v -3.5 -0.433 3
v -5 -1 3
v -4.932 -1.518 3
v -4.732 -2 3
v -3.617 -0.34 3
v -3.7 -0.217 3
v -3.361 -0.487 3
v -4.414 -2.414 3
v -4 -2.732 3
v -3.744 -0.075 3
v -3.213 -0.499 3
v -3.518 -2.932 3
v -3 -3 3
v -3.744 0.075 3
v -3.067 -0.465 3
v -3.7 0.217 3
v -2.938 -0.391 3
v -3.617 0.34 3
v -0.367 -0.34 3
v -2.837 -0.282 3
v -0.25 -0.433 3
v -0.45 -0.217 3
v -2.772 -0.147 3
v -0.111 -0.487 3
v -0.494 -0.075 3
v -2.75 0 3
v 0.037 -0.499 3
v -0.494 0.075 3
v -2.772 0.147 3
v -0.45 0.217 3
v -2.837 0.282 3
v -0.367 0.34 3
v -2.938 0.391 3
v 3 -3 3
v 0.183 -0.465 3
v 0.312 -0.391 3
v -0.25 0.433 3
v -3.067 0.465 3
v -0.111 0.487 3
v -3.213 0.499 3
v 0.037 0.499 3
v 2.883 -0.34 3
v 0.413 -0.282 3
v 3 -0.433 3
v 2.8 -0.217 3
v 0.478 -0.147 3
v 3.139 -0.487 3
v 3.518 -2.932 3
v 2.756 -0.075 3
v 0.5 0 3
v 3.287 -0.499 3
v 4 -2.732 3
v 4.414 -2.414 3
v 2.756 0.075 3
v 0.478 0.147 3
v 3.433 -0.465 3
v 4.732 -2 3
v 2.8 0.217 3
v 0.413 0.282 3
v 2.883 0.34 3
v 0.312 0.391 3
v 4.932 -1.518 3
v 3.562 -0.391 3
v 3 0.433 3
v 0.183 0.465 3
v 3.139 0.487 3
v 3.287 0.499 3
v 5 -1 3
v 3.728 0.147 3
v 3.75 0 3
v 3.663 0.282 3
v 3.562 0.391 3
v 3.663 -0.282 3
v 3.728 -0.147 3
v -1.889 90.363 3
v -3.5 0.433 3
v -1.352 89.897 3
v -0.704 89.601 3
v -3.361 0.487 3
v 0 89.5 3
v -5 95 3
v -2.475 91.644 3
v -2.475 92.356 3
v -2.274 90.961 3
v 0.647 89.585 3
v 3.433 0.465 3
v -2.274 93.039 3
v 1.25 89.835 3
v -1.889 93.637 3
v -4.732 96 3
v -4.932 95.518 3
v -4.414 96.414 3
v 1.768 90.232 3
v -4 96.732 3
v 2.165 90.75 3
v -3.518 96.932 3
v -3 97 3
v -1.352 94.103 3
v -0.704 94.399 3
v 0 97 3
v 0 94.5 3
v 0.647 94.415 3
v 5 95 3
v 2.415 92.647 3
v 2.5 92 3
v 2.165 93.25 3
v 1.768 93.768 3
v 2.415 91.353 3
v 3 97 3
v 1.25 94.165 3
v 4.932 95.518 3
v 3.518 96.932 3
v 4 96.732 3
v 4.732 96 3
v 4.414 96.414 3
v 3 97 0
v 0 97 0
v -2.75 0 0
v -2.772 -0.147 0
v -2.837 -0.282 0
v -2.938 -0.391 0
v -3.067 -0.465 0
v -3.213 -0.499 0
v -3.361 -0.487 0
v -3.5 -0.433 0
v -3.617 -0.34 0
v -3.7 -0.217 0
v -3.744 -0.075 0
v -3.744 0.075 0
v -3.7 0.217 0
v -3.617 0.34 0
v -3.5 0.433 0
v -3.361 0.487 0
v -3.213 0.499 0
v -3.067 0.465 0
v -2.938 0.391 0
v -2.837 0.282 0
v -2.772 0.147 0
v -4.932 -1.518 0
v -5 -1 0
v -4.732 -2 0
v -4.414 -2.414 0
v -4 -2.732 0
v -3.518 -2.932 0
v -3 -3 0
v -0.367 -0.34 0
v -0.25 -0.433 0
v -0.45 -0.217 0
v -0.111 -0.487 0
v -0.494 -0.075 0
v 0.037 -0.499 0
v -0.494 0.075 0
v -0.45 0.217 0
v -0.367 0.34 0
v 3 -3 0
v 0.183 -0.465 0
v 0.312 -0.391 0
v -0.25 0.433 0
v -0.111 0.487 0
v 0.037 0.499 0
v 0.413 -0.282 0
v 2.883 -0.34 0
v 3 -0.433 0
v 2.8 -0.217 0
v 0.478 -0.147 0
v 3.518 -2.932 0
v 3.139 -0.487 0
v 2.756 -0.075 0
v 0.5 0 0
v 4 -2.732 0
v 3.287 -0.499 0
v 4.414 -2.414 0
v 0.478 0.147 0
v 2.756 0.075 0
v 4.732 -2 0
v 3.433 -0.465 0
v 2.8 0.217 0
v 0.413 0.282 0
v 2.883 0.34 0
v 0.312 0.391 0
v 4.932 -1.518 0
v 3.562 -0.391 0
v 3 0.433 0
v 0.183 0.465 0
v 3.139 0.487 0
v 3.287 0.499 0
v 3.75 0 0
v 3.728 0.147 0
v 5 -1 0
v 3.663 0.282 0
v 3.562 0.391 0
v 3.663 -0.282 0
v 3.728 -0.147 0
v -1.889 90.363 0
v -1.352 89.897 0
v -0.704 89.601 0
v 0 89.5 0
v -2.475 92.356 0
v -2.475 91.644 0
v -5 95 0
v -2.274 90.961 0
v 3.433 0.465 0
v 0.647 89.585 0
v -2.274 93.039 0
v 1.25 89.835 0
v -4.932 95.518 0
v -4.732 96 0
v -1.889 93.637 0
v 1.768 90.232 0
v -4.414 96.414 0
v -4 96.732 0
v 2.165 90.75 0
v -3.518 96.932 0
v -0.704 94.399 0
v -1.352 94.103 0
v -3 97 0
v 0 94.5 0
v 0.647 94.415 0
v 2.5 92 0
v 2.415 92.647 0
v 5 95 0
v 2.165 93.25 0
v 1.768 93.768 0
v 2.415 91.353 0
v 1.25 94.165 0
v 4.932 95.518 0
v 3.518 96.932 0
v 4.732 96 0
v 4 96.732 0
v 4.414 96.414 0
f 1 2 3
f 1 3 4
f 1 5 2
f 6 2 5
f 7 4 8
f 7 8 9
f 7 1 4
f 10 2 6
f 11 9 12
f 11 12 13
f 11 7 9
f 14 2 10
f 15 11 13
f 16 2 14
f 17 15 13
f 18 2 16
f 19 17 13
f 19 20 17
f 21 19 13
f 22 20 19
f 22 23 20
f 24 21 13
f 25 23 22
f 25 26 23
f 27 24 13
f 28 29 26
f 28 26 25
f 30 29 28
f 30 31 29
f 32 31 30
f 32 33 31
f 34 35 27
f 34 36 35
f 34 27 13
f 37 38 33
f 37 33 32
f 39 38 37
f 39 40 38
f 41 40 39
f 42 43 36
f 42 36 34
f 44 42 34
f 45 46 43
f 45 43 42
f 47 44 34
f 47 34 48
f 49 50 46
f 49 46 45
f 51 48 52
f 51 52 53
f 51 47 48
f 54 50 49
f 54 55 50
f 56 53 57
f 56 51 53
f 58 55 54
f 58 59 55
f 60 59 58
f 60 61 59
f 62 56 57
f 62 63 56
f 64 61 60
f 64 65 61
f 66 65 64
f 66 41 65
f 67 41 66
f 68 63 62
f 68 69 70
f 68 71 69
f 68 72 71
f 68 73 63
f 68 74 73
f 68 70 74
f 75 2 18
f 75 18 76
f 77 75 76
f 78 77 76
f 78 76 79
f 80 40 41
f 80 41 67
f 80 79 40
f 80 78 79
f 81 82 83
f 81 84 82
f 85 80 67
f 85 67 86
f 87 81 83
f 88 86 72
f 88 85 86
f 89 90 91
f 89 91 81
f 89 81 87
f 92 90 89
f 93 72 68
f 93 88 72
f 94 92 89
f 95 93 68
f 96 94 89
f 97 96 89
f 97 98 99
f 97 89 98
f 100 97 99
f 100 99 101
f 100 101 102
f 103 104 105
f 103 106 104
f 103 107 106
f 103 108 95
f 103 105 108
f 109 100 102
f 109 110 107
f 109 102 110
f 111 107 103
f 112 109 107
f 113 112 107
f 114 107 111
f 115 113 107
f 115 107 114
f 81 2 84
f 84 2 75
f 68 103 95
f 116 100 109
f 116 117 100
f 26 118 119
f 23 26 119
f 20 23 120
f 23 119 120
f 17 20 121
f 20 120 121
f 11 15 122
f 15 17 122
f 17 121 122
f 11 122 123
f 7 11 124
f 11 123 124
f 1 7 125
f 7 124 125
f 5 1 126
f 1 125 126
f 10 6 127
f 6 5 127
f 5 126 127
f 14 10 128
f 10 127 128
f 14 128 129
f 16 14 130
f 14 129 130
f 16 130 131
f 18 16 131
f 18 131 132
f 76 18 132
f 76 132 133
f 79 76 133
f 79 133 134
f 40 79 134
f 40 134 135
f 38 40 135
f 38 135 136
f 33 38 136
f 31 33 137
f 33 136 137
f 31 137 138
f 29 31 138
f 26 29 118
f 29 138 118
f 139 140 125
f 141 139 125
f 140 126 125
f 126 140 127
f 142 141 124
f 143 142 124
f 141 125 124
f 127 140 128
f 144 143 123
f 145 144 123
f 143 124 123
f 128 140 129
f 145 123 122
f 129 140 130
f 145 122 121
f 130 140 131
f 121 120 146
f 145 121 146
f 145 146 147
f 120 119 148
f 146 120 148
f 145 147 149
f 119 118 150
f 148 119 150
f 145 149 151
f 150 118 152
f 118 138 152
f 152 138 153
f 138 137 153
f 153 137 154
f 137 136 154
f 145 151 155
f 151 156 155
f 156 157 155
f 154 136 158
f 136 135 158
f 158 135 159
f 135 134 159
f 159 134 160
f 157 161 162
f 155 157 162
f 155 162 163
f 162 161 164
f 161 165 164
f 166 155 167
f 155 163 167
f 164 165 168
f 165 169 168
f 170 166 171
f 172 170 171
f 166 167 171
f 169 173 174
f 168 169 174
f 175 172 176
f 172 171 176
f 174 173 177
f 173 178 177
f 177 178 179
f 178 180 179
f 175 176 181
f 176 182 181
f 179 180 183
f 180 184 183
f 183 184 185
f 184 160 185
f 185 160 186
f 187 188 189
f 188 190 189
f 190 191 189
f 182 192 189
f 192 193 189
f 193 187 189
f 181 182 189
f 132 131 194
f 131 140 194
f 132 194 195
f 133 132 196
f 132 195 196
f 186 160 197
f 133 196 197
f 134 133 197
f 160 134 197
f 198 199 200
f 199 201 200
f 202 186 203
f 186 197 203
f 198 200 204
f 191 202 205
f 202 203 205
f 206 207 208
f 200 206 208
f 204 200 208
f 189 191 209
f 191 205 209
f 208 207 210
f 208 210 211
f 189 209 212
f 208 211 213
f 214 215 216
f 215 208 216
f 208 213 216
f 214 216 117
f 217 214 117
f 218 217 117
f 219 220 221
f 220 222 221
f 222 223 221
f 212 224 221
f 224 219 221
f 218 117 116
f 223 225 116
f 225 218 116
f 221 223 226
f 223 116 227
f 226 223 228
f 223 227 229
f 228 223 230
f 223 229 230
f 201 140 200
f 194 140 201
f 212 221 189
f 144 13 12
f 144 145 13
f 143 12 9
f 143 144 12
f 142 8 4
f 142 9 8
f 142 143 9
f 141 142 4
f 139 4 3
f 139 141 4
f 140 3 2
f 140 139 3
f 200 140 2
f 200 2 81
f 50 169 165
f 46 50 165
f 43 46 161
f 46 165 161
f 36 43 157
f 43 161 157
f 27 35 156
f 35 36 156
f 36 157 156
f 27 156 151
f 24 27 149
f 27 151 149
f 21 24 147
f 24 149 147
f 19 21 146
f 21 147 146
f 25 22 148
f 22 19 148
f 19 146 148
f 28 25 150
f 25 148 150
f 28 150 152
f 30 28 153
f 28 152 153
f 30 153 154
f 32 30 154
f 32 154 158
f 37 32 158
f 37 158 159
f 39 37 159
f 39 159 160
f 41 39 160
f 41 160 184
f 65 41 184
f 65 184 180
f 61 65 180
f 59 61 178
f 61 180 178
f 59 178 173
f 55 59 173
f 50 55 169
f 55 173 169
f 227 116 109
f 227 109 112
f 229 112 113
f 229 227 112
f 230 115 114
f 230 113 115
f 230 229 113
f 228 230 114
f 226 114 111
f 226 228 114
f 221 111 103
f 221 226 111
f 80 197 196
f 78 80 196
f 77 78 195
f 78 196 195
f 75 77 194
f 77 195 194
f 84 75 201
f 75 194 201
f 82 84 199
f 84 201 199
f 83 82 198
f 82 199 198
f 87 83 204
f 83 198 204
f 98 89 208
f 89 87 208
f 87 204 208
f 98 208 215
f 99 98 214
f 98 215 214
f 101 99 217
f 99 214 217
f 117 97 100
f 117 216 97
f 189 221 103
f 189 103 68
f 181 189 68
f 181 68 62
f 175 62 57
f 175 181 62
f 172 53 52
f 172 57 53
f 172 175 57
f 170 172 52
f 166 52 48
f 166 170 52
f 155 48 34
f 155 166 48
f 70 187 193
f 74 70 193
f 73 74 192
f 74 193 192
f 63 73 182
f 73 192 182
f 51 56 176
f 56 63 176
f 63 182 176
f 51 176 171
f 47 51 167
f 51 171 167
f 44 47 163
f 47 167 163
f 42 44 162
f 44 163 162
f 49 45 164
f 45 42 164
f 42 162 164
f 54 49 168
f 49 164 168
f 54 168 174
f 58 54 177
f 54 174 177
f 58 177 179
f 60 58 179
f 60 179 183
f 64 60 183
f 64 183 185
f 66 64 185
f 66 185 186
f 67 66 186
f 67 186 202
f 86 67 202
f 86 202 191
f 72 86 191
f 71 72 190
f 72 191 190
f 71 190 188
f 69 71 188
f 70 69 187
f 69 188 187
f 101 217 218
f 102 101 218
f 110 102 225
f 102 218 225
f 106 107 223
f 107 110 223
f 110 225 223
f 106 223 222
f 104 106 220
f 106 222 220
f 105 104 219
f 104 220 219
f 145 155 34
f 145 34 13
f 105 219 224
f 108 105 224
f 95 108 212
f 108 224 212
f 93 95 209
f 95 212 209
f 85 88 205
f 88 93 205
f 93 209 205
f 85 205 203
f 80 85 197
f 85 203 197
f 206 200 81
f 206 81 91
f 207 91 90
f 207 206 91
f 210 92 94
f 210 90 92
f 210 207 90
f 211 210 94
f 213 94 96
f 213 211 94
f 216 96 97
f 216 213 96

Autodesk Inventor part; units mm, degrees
ref_plane "YZ Plane" through (0, 0, 0) normal (1, 0, 0) x (0, 1, 0)
ref_plane "XZ Plane" through (0, 0, 0) normal (0, 1, 0) x (-1, 0, 0)
ref_plane "XY Plane" through (0, 0, 0) normal (0, 0, 1) x (1, 0, 0)
sketch "Sketch1" plane through (0, 0, 0) normal (0, 0, 1) x (1, 0, 0)
  circle A0 centre (0, 0) radius 0.5
  line L0 (-3, 97) -> (3, 97)
  line L1 (5, 95) -> (5, -1)
  line L2 (3, -3) -> (-3, -3)
  line L3 (-5, -1) -> (-5, 95)
  arc A1 (-3, 97) -> (-5, 95) centre (-3, 95) ccw
  arc A2 (5, 95) -> (3, 97) centre (3, 95) ccw
  arc A3 (-5, -1) -> (-3, -3) centre (-3, -1) ccw
  arc A4 (3, -3) -> (5, -1) centre (3, -1) ccw
  circle A5 centre (0, 92) radius 2.5
  line L4 (0, 97) -> (0, 86.8445)
  circle A6 centre (-3.25, 0) radius 0.5
  circle A7 centre (3.25, 0) radius 0.5
  point P0 (-5, 97)
  point P1 (-5, -3)
  point P2 (0, -3)
  dimension "d3" = 1
  dimension "d7" = 100
  dimension "d8" = 10
  dimension "d9" = 3
  dimension "d10" = 2
  dimension "d11" = 5
  dimension "d12" = 5
  dimension "d15" = 1
  dimension "d16" = 1
  dimension "d17" = 3.25
  dimension "d18" = 3.25
extrude "Extrusion1" add sketch "Sketch1" along normal blind 3
properties part number "FP V2 Servo Arm v2"
